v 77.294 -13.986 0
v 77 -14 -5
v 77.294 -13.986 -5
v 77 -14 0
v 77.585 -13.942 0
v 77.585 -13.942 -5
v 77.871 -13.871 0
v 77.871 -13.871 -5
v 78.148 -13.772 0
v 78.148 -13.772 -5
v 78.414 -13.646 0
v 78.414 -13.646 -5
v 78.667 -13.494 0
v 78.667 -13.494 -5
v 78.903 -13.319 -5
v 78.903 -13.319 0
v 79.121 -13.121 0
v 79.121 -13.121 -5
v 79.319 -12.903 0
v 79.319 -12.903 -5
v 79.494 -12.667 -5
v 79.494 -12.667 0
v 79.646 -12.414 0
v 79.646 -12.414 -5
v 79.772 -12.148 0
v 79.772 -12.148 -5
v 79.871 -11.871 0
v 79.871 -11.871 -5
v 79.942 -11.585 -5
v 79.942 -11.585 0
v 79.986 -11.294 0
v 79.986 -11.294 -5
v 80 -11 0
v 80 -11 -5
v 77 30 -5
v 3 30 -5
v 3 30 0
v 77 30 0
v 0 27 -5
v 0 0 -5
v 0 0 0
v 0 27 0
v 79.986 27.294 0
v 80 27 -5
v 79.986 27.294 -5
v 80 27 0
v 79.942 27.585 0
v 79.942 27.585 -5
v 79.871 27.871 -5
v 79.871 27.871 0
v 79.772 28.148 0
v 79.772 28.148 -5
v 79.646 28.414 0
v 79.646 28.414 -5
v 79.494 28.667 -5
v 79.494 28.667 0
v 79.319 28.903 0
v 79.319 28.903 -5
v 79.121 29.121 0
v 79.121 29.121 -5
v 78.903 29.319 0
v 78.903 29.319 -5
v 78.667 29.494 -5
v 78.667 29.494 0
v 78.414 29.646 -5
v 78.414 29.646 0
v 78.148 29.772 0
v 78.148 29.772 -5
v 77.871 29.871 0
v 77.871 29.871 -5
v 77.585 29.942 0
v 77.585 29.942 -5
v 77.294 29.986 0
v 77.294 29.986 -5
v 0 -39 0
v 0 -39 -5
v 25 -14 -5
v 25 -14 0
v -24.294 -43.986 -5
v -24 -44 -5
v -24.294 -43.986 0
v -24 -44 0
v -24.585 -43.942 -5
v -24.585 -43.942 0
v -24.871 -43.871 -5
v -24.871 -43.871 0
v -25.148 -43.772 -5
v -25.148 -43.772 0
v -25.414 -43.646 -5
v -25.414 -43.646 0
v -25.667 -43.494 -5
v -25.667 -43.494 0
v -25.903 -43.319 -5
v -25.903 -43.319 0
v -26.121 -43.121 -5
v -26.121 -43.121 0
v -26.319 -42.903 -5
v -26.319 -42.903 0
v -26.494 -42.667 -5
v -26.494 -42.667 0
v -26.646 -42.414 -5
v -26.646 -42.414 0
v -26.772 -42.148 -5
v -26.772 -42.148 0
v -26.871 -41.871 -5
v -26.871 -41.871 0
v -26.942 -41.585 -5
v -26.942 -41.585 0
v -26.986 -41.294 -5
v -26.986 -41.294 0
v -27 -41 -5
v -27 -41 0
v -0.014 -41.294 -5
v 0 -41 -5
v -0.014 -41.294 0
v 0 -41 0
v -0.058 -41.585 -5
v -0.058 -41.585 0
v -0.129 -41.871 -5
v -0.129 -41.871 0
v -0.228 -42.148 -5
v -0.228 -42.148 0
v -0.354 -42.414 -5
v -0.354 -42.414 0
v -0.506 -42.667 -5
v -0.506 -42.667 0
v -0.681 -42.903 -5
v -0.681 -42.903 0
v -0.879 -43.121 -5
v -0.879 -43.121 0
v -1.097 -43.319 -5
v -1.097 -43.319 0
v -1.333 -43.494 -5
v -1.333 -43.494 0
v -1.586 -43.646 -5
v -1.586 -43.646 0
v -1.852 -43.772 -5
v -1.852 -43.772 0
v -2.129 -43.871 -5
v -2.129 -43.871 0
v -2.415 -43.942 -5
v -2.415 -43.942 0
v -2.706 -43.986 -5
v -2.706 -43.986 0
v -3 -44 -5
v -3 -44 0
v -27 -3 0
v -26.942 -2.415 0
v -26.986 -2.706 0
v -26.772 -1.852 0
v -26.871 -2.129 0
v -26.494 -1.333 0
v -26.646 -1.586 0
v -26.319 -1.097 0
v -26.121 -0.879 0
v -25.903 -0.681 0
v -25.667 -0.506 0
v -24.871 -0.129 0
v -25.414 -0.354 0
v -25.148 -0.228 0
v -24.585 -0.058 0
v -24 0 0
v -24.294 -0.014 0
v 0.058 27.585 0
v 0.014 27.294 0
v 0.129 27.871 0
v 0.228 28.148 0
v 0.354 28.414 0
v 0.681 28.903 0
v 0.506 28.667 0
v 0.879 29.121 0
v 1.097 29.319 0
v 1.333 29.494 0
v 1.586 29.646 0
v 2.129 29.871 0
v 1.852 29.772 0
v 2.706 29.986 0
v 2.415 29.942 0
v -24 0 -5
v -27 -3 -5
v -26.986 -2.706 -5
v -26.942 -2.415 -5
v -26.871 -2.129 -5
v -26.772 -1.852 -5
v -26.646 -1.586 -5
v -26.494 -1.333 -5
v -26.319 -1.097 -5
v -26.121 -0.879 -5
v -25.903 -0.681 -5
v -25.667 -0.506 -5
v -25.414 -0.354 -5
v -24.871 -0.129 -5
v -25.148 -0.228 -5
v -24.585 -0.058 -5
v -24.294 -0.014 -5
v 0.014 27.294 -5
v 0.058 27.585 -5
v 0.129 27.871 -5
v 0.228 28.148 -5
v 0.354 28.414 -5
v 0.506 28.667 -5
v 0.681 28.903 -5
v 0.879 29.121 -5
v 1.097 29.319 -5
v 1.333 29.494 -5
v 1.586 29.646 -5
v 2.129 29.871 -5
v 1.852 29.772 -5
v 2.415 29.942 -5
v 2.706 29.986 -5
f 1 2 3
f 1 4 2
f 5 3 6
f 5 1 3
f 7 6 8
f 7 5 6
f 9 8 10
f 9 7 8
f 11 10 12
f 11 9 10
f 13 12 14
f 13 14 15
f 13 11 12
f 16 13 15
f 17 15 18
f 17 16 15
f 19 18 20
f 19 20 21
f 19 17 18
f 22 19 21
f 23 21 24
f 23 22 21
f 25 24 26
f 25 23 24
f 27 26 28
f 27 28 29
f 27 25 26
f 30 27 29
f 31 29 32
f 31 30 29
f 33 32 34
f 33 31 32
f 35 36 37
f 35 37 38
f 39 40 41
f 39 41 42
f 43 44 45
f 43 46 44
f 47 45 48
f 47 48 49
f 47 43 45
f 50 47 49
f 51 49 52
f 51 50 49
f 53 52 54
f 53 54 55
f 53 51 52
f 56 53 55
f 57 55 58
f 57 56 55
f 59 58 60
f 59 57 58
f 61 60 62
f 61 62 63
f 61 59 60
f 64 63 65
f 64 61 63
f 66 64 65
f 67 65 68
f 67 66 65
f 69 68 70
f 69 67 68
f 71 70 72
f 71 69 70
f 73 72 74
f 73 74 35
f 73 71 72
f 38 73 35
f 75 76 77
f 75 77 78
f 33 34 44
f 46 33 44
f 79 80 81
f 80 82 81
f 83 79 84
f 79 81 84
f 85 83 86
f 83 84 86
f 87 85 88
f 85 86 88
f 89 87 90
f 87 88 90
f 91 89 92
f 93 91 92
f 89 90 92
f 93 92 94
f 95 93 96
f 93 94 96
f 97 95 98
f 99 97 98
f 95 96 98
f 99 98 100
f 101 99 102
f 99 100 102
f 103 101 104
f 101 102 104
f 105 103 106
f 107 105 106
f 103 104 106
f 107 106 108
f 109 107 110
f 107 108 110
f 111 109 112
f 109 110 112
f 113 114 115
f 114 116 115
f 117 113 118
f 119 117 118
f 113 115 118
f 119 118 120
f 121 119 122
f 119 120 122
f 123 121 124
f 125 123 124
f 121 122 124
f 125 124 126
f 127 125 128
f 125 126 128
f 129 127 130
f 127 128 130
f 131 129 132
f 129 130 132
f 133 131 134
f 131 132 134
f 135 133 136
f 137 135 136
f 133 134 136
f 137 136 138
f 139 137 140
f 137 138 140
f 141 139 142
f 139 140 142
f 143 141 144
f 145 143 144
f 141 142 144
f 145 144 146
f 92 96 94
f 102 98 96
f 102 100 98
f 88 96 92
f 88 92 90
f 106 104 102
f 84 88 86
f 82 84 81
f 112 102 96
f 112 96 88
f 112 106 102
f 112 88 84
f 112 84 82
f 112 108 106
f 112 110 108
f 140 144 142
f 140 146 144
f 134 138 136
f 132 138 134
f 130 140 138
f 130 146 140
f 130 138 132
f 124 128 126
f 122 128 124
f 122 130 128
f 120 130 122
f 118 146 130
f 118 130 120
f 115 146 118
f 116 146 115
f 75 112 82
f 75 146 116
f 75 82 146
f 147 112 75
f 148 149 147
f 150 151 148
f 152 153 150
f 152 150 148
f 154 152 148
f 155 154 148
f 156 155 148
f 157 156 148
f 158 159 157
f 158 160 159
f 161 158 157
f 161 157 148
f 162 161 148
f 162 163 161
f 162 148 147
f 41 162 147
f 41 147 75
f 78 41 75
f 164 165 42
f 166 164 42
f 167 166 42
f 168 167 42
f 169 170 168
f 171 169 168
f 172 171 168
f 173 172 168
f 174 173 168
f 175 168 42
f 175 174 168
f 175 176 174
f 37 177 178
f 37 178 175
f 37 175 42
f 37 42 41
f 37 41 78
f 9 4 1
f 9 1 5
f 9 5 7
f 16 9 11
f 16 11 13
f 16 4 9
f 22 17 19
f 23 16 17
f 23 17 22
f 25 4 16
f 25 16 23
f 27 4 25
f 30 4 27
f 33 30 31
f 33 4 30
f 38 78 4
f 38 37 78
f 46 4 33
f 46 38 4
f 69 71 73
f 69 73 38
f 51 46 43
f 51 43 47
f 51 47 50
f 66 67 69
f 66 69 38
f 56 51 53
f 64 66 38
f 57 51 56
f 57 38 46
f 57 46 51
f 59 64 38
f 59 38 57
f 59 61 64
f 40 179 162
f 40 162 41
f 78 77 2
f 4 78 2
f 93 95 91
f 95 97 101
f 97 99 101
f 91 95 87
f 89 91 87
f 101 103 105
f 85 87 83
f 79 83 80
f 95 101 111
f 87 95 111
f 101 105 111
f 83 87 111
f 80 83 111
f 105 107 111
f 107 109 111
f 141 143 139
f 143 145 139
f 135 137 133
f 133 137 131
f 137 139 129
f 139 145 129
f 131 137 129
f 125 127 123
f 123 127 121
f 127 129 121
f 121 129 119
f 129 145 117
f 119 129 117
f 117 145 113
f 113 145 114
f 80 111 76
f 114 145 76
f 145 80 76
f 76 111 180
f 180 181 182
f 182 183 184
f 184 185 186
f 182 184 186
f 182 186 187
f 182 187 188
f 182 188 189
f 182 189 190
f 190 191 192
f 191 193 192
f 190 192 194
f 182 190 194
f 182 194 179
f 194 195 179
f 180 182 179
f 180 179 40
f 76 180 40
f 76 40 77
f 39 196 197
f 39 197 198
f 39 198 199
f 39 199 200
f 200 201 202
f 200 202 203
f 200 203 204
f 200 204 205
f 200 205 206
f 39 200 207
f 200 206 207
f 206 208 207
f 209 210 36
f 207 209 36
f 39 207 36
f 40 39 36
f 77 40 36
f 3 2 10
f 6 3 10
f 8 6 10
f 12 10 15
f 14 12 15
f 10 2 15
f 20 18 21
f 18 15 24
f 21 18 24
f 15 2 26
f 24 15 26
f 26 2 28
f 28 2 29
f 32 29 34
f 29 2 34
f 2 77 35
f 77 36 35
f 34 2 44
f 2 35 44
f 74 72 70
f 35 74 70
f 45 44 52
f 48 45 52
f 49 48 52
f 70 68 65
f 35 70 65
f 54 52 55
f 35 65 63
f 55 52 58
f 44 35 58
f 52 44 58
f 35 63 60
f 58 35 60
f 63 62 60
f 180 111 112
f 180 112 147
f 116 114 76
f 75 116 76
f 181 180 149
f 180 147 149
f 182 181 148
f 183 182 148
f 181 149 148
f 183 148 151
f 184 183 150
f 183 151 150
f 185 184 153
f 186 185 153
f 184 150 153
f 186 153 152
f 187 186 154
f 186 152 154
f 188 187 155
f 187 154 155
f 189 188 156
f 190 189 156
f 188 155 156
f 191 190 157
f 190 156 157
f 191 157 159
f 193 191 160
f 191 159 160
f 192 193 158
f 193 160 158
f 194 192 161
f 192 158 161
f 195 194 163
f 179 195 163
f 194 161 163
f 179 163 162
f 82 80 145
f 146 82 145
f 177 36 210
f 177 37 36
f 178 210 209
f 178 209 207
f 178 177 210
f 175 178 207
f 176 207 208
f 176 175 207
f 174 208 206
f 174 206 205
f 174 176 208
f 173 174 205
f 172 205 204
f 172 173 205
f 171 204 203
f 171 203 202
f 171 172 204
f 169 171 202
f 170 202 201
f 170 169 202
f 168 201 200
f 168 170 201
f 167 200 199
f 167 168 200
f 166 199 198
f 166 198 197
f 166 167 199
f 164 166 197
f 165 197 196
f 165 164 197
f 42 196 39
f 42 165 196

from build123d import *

# Parameters (mm, degrees)
BOX018_W        = 27
BOX018_H        = 44
BOX018_DEPTH    = 5
BOX019_W        = 80
BOX019_H        = 44
BOX019_DEPTH    = 5
CHAMFER016_SIZE = 25
FILLET004003_R  = 3


with BuildPart() as cube018:
    # Box018 → Box018 (new body)
    with BuildSketch(Plane(origin=(-27, -44, -5), x_dir=(1, 0, 0), z_dir=(0, 0, 1))):
        with Locations((13.5, 22)):
            Rectangle(BOX018_W, BOX018_H)
    extrude(amount=BOX018_DEPTH)


with BuildPart() as fillet004003:
    # Box019 → Box019 (new body)
    with BuildSketch(Plane(origin=(0, -14, -5), x_dir=(1, 0, 0), z_dir=(0, 0, 1))):
        with Locations((40, 22)):
            Rectangle(BOX019_W, BOX019_H)
    extrude(amount=BOX019_DEPTH)

    # Fusion006002011004053036004001003009006003: union Cube018
    add(cube018.part)

    # Chamfer016
    chamfer016_edges = [fillet004003.edges().sort_by_distance(p)[0] for p in [
        (0, -14, -2.5),
    ]]
    chamfer(chamfer016_edges, length=CHAMFER016_SIZE)

    # Fillet004003
    fillet004003_edges = [fillet004003.edges().sort_by_distance(p)[0] for p in [
        (80, -14, -2.5),
        (80, 30, -2.5),
        (0, 30, -2.5),
        (0, -44, -2.5),
        (-27, -44, -2.5),
        (-27, 0, -2.5),
    ]]
    fillet(fillet004003_edges, radius=FILLET004003_R)


solid = fillet004003.part
